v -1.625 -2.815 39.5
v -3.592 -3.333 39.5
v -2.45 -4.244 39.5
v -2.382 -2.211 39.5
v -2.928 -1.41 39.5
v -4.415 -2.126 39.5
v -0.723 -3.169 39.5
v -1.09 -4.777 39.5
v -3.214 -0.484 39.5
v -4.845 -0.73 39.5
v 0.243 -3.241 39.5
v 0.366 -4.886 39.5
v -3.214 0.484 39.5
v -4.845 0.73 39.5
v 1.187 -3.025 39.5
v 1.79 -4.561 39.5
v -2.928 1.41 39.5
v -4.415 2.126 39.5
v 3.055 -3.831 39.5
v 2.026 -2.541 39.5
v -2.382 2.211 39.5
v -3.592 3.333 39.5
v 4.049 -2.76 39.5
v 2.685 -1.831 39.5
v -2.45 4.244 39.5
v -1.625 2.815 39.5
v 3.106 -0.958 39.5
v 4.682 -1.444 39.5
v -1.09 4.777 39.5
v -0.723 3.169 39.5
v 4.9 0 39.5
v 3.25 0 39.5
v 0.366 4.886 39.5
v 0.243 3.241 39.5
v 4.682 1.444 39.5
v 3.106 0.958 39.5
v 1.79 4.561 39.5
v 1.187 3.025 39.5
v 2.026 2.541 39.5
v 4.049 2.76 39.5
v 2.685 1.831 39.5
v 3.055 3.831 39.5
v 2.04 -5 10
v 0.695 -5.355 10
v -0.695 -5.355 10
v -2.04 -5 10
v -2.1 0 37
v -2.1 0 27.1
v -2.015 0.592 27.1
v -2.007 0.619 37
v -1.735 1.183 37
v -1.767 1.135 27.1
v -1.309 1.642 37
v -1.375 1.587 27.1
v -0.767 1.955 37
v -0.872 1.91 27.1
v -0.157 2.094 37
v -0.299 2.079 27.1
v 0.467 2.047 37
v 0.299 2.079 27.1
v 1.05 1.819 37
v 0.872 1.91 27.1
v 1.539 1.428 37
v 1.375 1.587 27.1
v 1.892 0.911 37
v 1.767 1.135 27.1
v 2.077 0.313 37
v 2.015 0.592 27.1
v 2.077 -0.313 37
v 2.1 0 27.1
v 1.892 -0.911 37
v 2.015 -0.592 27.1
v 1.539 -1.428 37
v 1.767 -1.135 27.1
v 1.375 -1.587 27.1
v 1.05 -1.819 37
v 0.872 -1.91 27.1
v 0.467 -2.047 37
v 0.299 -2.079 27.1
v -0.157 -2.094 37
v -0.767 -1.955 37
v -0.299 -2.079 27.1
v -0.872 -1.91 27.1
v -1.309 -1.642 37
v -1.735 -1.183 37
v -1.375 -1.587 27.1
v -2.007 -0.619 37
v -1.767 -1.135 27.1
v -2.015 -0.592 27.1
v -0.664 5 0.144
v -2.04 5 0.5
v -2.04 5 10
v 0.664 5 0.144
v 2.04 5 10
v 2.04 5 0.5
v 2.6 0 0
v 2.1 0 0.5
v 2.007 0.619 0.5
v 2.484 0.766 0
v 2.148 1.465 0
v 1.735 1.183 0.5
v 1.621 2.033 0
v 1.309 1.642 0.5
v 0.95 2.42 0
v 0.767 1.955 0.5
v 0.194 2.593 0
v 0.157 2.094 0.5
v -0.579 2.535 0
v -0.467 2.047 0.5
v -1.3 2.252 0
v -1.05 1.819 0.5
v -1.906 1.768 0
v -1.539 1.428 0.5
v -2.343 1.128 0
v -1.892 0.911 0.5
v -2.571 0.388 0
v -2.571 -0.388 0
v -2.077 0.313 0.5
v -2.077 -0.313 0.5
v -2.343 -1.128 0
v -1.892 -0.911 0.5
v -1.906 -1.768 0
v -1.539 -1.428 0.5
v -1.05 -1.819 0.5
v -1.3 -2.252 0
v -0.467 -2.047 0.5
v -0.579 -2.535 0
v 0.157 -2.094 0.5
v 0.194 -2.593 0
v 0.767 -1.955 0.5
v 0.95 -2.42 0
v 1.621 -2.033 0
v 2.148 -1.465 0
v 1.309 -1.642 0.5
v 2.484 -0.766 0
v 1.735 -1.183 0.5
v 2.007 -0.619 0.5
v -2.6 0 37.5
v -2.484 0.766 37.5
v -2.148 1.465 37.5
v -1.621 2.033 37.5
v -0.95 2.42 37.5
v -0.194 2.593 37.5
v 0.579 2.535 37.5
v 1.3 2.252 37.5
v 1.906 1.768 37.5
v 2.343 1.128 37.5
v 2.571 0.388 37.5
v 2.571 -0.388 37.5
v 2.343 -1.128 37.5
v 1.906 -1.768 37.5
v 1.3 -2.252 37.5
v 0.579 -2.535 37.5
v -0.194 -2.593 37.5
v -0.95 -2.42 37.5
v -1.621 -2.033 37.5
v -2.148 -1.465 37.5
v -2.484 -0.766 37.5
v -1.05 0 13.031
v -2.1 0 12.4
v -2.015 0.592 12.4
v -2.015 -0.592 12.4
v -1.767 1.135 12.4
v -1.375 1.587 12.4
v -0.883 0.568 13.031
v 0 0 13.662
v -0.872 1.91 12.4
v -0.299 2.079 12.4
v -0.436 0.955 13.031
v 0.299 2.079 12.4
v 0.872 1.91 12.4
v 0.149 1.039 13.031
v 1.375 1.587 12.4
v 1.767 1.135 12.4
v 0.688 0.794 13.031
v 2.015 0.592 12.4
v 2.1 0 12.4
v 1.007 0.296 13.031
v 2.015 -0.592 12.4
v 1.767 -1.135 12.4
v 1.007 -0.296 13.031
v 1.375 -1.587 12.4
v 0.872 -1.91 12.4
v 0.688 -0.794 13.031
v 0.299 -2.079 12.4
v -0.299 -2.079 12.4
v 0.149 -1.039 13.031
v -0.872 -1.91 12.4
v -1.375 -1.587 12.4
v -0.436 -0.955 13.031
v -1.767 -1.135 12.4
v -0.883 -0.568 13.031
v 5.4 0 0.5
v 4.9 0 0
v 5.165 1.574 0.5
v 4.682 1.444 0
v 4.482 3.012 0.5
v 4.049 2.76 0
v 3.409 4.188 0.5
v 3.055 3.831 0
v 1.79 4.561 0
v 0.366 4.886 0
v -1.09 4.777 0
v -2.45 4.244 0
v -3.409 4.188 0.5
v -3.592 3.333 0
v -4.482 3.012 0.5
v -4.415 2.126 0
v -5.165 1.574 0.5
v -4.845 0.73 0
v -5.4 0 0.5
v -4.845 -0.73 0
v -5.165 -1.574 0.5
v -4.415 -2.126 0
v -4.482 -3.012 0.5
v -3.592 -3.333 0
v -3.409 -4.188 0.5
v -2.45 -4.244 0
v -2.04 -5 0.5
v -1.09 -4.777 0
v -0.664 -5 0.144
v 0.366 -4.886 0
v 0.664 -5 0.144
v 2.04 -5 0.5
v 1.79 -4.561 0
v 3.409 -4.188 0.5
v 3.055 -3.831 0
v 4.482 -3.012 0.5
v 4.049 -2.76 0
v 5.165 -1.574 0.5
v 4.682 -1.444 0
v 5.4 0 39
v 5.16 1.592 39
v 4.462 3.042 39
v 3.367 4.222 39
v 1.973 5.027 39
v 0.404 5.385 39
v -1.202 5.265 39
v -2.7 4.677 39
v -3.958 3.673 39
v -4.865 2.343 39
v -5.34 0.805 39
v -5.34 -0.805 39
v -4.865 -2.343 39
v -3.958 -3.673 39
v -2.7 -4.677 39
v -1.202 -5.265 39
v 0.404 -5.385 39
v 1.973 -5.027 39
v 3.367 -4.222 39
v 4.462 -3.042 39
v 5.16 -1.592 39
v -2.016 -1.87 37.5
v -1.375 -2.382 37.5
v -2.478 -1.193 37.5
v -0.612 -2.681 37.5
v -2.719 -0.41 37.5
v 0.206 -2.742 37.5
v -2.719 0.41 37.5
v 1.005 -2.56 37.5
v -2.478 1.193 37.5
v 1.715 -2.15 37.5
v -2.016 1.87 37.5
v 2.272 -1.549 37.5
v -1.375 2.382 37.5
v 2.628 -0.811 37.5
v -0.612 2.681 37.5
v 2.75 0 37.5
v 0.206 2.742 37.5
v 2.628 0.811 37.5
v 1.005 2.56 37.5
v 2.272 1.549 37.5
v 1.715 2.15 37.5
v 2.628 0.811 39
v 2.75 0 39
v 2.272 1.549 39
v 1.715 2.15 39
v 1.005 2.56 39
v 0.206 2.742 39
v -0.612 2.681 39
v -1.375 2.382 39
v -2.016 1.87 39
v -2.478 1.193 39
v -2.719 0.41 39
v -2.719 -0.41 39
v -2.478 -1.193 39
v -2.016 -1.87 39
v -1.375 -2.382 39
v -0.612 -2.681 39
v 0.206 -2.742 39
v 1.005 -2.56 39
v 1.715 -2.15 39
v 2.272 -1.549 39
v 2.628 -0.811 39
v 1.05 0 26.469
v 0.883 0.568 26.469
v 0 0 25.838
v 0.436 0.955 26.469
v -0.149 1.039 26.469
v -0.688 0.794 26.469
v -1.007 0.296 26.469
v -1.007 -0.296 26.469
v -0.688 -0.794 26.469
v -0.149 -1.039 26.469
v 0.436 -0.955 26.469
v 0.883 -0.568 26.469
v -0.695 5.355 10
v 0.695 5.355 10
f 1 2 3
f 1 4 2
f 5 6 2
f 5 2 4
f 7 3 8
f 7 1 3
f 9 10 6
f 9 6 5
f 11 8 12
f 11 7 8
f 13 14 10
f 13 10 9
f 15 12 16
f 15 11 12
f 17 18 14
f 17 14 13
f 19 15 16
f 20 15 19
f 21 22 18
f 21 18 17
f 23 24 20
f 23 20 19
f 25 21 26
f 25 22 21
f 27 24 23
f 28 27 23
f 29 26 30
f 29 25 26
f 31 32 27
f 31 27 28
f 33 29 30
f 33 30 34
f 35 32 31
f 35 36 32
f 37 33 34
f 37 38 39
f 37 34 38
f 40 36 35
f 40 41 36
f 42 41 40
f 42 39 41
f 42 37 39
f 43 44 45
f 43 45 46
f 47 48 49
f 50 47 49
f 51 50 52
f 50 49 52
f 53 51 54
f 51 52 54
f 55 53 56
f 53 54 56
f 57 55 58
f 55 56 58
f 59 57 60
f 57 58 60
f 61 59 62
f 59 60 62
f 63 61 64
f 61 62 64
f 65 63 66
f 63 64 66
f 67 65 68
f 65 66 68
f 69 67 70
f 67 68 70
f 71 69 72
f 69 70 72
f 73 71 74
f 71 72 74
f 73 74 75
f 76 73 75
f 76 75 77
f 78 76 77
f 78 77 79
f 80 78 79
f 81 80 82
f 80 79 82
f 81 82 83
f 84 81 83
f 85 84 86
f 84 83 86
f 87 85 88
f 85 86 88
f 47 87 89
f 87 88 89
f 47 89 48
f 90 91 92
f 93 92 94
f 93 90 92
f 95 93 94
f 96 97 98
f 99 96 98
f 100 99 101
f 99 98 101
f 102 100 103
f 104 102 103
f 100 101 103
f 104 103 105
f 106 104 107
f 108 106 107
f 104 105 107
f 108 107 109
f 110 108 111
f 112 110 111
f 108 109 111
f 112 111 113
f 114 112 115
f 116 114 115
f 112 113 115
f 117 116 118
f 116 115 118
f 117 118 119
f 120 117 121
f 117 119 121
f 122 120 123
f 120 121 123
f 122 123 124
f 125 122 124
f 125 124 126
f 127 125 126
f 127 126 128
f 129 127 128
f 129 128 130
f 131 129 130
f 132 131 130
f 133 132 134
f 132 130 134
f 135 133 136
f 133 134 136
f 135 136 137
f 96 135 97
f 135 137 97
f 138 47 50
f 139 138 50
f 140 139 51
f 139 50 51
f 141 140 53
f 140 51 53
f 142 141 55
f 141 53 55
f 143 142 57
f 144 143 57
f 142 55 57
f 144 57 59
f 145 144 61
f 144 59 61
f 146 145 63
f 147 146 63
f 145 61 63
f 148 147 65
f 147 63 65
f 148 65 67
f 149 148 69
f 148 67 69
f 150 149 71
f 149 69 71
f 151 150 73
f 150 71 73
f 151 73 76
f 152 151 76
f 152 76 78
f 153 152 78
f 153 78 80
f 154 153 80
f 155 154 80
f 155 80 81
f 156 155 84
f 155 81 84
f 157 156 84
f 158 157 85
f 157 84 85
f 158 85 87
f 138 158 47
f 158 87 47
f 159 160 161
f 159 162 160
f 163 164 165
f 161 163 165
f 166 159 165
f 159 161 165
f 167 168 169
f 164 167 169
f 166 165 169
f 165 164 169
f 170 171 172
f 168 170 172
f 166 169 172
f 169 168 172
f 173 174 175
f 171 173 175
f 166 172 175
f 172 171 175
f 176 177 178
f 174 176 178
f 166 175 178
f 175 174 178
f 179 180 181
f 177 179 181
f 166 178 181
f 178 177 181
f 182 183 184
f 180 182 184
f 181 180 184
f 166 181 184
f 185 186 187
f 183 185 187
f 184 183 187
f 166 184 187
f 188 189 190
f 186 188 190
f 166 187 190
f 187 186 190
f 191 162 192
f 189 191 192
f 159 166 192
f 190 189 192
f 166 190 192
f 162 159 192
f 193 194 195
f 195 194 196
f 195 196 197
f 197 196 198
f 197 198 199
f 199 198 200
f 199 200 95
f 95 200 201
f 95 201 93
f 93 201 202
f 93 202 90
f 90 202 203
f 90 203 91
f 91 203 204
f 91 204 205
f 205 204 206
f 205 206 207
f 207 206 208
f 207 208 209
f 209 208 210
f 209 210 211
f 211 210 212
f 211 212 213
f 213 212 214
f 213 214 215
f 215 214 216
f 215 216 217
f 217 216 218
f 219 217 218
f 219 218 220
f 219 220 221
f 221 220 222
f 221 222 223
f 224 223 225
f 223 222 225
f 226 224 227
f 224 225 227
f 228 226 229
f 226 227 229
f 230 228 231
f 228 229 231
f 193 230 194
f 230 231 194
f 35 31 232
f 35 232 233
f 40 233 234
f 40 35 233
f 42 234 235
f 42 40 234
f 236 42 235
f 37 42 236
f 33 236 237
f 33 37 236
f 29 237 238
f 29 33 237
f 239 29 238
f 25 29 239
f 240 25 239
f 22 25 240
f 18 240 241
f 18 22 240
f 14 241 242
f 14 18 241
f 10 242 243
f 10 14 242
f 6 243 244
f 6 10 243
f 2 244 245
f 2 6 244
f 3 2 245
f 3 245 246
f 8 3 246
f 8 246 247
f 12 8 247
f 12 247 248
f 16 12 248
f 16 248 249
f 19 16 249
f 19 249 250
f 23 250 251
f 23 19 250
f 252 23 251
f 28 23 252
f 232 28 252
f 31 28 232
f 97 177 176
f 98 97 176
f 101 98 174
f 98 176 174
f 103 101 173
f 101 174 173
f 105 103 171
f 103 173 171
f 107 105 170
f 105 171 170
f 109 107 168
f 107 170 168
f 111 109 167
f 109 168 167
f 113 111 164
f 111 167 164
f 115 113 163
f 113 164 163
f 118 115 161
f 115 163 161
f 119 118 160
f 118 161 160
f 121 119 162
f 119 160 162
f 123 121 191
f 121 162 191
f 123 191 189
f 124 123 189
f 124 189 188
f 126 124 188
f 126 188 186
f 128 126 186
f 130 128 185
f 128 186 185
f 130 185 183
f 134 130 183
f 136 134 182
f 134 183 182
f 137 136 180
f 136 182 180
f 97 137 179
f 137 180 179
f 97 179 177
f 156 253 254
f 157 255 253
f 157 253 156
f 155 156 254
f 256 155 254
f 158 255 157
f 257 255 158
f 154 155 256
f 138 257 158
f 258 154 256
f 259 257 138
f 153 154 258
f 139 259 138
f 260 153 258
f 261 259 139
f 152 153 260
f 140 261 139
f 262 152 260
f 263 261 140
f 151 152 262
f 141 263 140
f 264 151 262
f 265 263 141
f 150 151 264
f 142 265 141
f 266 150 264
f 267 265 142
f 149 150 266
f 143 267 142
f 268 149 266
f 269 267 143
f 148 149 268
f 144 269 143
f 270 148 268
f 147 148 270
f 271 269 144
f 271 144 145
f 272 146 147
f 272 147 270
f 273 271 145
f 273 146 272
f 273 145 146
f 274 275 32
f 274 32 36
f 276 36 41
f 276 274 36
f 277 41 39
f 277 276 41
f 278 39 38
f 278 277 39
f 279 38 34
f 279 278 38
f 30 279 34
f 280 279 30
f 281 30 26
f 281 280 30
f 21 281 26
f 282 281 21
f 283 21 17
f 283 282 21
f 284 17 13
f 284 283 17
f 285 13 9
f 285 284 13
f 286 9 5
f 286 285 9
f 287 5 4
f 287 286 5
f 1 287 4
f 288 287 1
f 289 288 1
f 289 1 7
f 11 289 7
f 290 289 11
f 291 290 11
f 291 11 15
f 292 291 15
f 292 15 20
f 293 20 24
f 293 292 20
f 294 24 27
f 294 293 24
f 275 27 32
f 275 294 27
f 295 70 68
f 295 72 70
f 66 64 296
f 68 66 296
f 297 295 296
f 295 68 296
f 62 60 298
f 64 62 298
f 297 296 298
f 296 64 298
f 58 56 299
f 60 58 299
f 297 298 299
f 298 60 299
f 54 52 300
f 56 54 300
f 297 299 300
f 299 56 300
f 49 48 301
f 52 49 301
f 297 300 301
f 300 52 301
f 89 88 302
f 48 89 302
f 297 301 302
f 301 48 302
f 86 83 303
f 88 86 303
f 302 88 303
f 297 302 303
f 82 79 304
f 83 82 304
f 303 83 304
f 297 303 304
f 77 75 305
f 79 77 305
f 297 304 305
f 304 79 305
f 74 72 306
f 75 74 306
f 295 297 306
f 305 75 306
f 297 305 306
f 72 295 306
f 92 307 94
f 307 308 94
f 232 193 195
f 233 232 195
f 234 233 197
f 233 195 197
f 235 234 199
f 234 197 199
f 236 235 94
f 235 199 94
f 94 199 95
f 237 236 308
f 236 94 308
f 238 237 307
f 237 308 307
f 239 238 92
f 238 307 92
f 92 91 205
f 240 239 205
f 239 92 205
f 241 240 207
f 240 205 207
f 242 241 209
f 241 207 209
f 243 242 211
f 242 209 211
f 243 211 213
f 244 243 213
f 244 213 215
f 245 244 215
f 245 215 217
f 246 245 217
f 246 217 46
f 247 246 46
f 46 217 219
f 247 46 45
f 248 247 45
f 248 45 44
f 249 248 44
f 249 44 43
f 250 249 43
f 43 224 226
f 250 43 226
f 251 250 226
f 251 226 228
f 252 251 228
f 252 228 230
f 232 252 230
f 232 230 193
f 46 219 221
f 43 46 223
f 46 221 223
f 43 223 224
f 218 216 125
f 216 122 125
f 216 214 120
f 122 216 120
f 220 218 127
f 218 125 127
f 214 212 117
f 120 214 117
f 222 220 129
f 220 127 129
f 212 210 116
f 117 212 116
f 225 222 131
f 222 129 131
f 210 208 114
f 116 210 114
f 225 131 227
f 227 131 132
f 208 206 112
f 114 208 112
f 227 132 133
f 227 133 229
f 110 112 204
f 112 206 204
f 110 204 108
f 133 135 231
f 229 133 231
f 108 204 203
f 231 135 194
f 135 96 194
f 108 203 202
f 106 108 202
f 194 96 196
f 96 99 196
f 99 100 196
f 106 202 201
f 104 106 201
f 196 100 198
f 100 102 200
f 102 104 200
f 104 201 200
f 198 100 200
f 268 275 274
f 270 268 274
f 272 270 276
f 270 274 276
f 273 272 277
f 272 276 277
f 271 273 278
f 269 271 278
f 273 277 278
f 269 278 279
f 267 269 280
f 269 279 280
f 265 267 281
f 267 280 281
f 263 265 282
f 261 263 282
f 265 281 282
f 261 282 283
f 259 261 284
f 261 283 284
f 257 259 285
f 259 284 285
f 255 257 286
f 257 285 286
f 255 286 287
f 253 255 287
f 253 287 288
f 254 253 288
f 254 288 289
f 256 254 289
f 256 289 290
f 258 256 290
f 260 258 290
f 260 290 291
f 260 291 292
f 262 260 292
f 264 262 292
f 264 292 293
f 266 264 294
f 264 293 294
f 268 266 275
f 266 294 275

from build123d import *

# Parameters (mm, degrees)
SKETCH_1_R             = 5.4
EXTRUDE_1_DEPTH        = 39.5
HOLE_WIZARD_M5_2_D     = 4.2
HOLE_WIZARD_M5_2_DEPTH = 12.4
HOLE_WIZARD_M5_2_TIP   = 1.2618073
CHAMFER_2_SIZE         = 0.5
SKETCH_9_R             = 2.75
CUT_EXTRUDE_5_DEPTH    = 2
CHAMFER_3_SIZE         = 0.5
CHAMFER_4_SIZE         = 0.5
HOLE_WIZARD_M5_1_D     = 4.2
HOLE_WIZARD_M5_1_DEPTH = 12.4
HOLE_WIZARD_M5_1_TIP   = 1.2618073
CHAMFER_5_SIZE         = 0.5
SKETCH_11_W            = 10
SKETCH_11_H            = 2
CUT_EXTRUDE_6_DEPTH    = 10


with BuildPart() as part:
    # 草图1 → 拉伸1 (new body)
    with BuildSketch(Plane.XY):
        Circle(SKETCH_1_R)
    extrude(amount=EXTRUDE_1_DEPTH)

    # M5 螺纹孔2
    with Locations(Plane.XY.offset(39.5)):
        with Locations((0, 0)):
            Hole(HOLE_WIZARD_M5_2_D / 2, depth=HOLE_WIZARD_M5_2_DEPTH)
            with Locations((0, 0, -(HOLE_WIZARD_M5_2_DEPTH + HOLE_WIZARD_M5_2_TIP / 2))):  # 118° drill point
                Cone(0, HOLE_WIZARD_M5_2_D / 2, HOLE_WIZARD_M5_2_TIP, mode=Mode.SUBTRACT)

    # 倒角2
    chamfer_2_edges = [part.edges().sort_by_distance(p)[0] for p in [
        (-5.4, 0, 39.5),
    ]]
    chamfer(chamfer_2_edges, length=CHAMFER_2_SIZE)

    # 草图9 → 拉伸5 (cut)
    with BuildSketch(Plane.XY.offset(39.5)):
        Circle(SKETCH_9_R)
    extrude(amount=-CUT_EXTRUDE_5_DEPTH, mode=Mode.SUBTRACT)

    # 倒角3
    chamfer_3_edges = [part.edges().sort_by_distance(p)[0] for p in [
        (-2.75, 0, 39.5),
        (2.1, 0, 37.5),
    ]]
    chamfer(chamfer_3_edges, length=CHAMFER_3_SIZE)

    # 倒角4
    chamfer_4_edges = [part.edges().sort_by_distance(p)[0] for p in [
        (-5.4, 0, 0),
    ]]
    chamfer(chamfer_4_edges, length=CHAMFER_4_SIZE)

    # M5 螺纹孔1
    with Locations(Plane(origin=(0, 0, 0), x_dir=(-1, 0, 0), z_dir=(0, 0, -1))):
        with Locations((0, 0)):
            Hole(HOLE_WIZARD_M5_1_D / 2, depth=HOLE_WIZARD_M5_1_DEPTH)
            with Locations((0, 0, -(HOLE_WIZARD_M5_1_DEPTH + HOLE_WIZARD_M5_1_TIP / 2))):  # 118° drill point
                Cone(0, HOLE_WIZARD_M5_1_D / 2, HOLE_WIZARD_M5_1_TIP, mode=Mode.SUBTRACT)

    # 倒角5
    chamfer_5_edges = [part.edges().sort_by_distance(p)[0] for p in [
        (-2.1, 0, 0),
    ]]
    chamfer(chamfer_5_edges, length=CHAMFER_5_SIZE)

    # 草图11 → 拉伸6 (cut)
    with BuildSketch(Plane.XY):
        with Locations((0, 6)):
            Rectangle(SKETCH_11_W, SKETCH_11_H)
    cut_extrude_6 = extrude(amount=CUT_EXTRUDE_6_DEPTH, mode=Mode.SUBTRACT)

    # 镜向1: 拉伸6 across plane
    add(cut_extrude_6.mirror(Plane.ZX), mode=Mode.SUBTRACT)


solid = part.part
